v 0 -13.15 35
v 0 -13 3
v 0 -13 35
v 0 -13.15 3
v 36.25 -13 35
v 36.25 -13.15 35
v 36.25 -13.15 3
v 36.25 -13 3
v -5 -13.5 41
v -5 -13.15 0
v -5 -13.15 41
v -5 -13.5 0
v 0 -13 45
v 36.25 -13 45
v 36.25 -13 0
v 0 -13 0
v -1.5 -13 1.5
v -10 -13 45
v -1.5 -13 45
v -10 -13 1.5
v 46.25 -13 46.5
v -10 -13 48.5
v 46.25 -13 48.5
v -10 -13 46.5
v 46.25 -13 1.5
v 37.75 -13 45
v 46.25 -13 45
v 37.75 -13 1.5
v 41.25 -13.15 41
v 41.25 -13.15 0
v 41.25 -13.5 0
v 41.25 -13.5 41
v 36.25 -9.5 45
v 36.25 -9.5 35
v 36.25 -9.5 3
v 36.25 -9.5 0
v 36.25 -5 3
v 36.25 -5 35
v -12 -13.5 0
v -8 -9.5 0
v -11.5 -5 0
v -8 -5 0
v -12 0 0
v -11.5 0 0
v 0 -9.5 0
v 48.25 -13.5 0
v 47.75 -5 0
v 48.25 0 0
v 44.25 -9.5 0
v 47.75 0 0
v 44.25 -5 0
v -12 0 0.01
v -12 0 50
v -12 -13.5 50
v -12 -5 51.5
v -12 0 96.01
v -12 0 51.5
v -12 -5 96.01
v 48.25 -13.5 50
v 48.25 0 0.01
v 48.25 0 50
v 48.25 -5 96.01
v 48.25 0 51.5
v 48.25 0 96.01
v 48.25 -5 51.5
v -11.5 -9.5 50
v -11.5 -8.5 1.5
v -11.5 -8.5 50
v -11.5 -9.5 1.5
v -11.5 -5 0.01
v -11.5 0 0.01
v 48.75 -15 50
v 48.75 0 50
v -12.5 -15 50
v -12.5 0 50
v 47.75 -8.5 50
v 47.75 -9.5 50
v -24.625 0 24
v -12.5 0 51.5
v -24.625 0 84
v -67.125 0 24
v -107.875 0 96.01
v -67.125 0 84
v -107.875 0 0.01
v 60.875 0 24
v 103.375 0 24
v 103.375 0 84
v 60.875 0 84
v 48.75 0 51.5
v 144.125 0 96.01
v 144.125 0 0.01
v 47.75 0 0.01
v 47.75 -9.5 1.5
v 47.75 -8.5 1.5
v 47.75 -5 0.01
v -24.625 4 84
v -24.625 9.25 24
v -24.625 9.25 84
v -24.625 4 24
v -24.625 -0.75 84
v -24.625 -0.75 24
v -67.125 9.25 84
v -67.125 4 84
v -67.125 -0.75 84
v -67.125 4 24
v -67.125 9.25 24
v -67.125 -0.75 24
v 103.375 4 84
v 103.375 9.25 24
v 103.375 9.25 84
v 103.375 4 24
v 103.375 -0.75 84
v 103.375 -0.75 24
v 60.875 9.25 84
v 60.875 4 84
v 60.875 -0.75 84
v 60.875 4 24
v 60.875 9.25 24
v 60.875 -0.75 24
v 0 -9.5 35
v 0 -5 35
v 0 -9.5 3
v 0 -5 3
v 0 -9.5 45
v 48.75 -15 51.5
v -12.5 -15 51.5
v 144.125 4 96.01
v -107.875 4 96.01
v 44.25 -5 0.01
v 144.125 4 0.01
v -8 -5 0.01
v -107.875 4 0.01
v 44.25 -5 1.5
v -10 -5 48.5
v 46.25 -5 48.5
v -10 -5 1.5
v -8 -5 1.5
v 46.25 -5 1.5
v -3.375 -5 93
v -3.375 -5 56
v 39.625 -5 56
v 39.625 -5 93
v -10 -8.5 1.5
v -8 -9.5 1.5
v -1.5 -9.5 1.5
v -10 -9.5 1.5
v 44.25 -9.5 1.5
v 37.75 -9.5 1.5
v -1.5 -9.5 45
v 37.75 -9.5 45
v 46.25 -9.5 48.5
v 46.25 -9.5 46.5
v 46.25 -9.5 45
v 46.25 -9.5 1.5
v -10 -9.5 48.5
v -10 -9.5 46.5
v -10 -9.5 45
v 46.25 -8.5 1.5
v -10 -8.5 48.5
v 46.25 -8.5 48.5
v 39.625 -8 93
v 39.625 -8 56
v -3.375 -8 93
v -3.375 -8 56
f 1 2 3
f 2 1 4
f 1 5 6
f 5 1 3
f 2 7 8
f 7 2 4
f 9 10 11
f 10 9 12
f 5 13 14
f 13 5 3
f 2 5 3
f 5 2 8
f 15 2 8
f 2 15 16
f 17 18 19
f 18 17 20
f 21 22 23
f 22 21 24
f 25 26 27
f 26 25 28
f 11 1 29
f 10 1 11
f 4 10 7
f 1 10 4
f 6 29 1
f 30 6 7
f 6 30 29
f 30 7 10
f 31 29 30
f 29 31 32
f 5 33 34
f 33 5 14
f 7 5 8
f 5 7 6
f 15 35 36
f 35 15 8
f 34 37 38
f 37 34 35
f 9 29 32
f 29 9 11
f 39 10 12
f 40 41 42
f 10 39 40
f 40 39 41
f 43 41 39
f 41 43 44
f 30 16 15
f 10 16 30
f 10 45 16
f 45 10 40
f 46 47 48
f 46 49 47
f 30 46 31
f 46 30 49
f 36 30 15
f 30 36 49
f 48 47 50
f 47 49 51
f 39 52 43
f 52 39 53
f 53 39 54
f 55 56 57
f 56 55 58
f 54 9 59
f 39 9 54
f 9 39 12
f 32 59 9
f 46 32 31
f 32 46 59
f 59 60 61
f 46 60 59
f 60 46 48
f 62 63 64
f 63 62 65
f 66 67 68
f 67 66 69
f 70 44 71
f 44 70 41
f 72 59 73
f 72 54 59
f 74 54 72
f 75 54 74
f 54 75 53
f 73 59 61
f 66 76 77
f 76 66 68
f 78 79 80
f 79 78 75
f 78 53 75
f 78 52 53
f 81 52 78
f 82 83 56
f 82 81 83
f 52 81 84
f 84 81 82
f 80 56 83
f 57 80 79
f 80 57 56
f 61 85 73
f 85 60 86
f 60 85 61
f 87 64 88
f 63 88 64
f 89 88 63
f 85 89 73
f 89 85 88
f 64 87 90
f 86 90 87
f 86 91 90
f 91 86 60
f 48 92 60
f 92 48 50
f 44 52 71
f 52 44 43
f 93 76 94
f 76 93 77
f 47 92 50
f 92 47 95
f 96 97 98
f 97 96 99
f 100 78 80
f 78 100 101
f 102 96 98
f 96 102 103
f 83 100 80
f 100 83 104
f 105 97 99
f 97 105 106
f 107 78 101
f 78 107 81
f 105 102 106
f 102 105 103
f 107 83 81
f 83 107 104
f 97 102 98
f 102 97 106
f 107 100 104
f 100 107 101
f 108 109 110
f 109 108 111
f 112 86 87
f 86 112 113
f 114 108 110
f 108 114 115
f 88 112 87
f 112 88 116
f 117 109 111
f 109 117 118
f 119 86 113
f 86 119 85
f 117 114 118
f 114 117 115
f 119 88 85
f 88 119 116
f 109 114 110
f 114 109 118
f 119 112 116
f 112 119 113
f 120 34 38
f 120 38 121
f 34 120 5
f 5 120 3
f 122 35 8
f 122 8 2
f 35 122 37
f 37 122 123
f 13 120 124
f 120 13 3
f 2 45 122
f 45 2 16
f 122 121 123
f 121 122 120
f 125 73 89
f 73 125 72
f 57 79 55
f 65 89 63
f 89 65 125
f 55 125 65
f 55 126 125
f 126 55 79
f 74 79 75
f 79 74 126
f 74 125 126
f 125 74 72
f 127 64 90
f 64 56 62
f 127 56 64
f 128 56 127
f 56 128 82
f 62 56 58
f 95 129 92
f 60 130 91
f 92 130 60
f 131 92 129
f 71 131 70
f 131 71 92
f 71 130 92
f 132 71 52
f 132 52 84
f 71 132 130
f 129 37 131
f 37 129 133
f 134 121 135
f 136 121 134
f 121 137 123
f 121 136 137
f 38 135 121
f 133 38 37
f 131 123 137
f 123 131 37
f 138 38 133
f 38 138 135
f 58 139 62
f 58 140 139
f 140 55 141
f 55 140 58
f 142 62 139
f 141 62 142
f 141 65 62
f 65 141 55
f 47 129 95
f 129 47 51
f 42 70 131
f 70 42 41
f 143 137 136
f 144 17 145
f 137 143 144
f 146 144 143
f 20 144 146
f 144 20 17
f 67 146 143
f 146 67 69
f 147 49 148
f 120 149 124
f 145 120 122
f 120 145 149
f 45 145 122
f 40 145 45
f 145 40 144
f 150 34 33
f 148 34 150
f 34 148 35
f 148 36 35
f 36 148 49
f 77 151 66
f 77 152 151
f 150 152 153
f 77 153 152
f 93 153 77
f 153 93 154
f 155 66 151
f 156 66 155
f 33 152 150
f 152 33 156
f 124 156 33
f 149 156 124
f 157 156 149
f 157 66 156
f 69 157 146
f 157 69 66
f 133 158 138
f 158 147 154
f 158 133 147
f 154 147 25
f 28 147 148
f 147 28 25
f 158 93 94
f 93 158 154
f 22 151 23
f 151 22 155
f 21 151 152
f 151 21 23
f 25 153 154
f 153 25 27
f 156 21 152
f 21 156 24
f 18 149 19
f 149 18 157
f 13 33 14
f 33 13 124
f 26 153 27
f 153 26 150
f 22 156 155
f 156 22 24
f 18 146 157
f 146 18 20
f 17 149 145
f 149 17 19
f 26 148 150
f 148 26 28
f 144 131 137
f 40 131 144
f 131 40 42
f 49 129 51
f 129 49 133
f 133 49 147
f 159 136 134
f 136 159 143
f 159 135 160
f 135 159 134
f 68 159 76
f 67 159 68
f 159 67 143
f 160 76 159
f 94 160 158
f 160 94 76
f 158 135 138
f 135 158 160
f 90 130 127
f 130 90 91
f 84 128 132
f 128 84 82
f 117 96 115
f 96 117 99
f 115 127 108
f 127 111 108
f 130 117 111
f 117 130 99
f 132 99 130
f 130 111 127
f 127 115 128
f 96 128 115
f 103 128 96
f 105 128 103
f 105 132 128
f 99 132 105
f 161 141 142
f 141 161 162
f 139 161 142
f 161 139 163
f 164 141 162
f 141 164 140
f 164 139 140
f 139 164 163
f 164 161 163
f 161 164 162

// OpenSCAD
// Fireplace parameteric model V1
// 


/* [Colors (Red, Green, Blue)] */
// Ceiling
Ceil_Color = [0.95,0.95,0.95]; //[0:0.05:1]
ceil_color = Ceil_Color;
// Mantel
Matel_Color = [0.95,0.95,0.95]; //[0:0.05:1]
mantel_color = Matel_Color;
// Tile (right next to firebox)
Tile_Color = [0.75,0.75,0.75]; //[0:0.05:1]
tile_color = Tile_Color;
// Wall
Wall_Color = [0.45,0.45,0.45]; //[0:0.05:1]
wall_color = Wall_Color;
// Picture
Picture_Color = [0.75,0.75,0.75]; //[0:0.05:1]
picture_color = Picture_Color;
// Floor
Floor_Color = [0.45,0.35,0.15]; //[0:0.05:1]
floor_color = Floor_Color;


/* [Firebox Dimensions && Placement] */
// Width of the firebox opening
firebox_w = 36.25;//[0:0.05:40.0]
// Height of the firebox opening
firebox_h = 32.0;//[0:0.1:40.0]
// Depth of firebox (shouldn't really mater in most cases)
firebox_d = 16;//[0:0.05:20.0]
//How far does the firebox sticks out into the room (inch)
from_wall_d = 13; //[0:0.05:16.0]
// Top Clearance for Framing
firebox_top_framing_clearance = 10;
// Hide firebox
firebox_hide = false;


/* [Shelf Overhang && Thickness] ************************/
//Shelf overhang on left and right ends
mantel_shelf_overhang_w = 0.5; //[0:0.25:10.0] 
//Shelf overhang into the room from mantel body
mantel_shelf_overhang_d = 1.5; //[0:0.25:10.0]
//Shelf thickness height
mantel_shelf_h = 1.5;


/* [Mantel Height Adjustments] */
//Mantel visible on top of the tile below the shelf
mantel_top_h = 9;//[0:0.25:192.0]
//Tile visible on top of the firebox
tile_top_h = 6; //[0:0.25:192.0]
//Lift Firebox Up
firebox_lift_height = 3;//[0:0.1:10]

/* [Mantel Width Adjustments] */
//Mantel visible on each side of the tile
mantel_leg_w = 7;//[0:0.25:15.0]
//Tile visible on each side of the firebox
tile_leg_w = 5; //[0:0.25:20.0]

/* [Thickness && Side Material] */
// Thickness of the tile
tile_depth = 0.15;
//Tile Sides - tiles the sides
tile_sides = false;
//Thickness of the material
mantel_front_d = .5;


/* [Fireplace Bump Out] */
//Show the mantel bump out
show_above_mantel = true;
//Above fireplace (inch)
above_fireplace_depth = 5;//[0:0.1:10.0]
above_fireplace_width_inset = 0;//[-10.0:0.01:10.0]

/* [Room] */
//Show Wall
show_wall = true;
//Height of ceiling (inch)
ceiling_height = 96; //[36:0.5:192]
// Show ceiling
show_ceil = false;
//Width of the wall (feet)
wall_width_feet = 21; // [0:0.25:50]
//Show Floor
show_floor = false;
//Floor depth from wall (feet)
floor_depth_feet = 21; // [0:0.25:50]

//Show Windows
show_windows = true;
//Distance between windows
window_distance = 85.5; //[0:0.5:192]
//Windows width, height
window_dimensions = [42.5, 60];
//Window height above floor
window_above_floor = 24; //[0:0.5:192]

/* [Picture] */
//Show Picture over mantel
show_picture = true;
//Picture Width,Height,Depth 
picture_dim = [43, 37, 3];
//Picture Height above floor
picture_z = 56; //[0:0.5:192]
// Picture Color (R,G,B)
//Picture_Color = [0.75,0.75,0.75]; //[0:0.05:1]
//picture_color = Picture_Color;

/* [Show Frame] */
show_frame = false;
//frame_dim = ["2x4","2x6"];

/* [Show Dimensions] */
// Show Dimensions (inch)
show_dims = true;

// *********************************************************************

// Firebox
    if (!firebox_hide) {
        color("black")
        translate([0, -from_wall_d, firebox_lift_height]) 
        cube([firebox_w,firebox_d,firebox_h], false);
    }

//Under Firebox
    uf_w = firebox_w + (tile_leg_w * 2); 
    uf_d = tile_depth;
    uf_h = firebox_lift_height;

    uf_x = -tile_leg_w;
    uf_y = -tile_depth - from_wall_d;

    color(tile_color)
    translate([uf_x, uf_y])
    cube([uf_w,uf_d,uf_h], false);

// Tile Top
    tt_w = (2 * tile_leg_w) + firebox_w;
    tt_d = tile_depth;
    tt_h = tile_top_h;

    tt_x = -tile_leg_w;
    tt_y =  -tile_depth - from_wall_d;
    tt_z = firebox_lift_height + firebox_h;

    if (!show_frame) {
        color(tile_color)
        translate([tt_x, tt_y, tt_z]) 
        cube([tt_w,,tt_d, tt_h], false);
    }

// Tile Legs (tile next to firebox horizontal sides)
    tl_w = tile_leg_w;
    tl_d = tile_depth;
    tl_h = firebox_h;

    tl_l_x = -tl_w;
    tl_y = -tile_depth - from_wall_d;
    tl_z = firebox_lift_height;
    
    tl_r_x = firebox_w;

    if (!show_frame) {
        color(tile_color)
        translate([tl_l_x, tl_y, tl_z]) 
        cube([tl_w,tl_d, tl_h], false);
    
        color(tile_color)
        translate([tl_r_x, tl_y, tl_z]) 
        cube([tl_w,tl_d, tl_h], false);
    }
    
// Mantel Shelf
    shelf_w = (2 * tile_leg_w) + firebox_w + (2 * mantel_leg_w) + (2 * mantel_shelf_overhang_w);
    shelf_d = mantel_shelf_overhang_d + mantel_front_d + from_wall_d;
    shelf_h = mantel_shelf_h;

    shelf_x = -tile_leg_w - mantel_leg_w - mantel_shelf_overhang_w;
    shelf_y = -shelf_d;
    shelf_z = firebox_h + tile_top_h + mantel_top_h + firebox_lift_height;

    if (!show_frame) {
        color(mantel_color)
        translate([shelf_x, shelf_y, shelf_z]) 
        cube([shelf_w, shelf_d, shelf_h], false);
    }

// Mantel Top (wood or other material under shelf)
    mt_w = (2 * tile_leg_w) + firebox_w + (2 * mantel_leg_w);
    mt_d = mantel_front_d;
    mt_h = mantel_top_h;

    mt_x = -tile_leg_w - mantel_leg_w;
    mt_y = -mantel_front_d - from_wall_d;
    mt_z = firebox_h + tile_top_h + firebox_lift_height;

    if (!show_frame) {
        color(mantel_color)
        translate([mt_x, mt_y, mt_z]) 
        cube([mt_w,mt_d, mt_h], false);
    }
    
// Mantel Legs (wood or other material on horizontal outside of  tile and firebox)
    m_w = mantel_leg_w;
    m_d = mantel_front_d;
    m_h = firebox_h + tile_top_h + firebox_lift_height;

    m_l_x = -tile_leg_w - mantel_leg_w;
    m_y = -mantel_front_d - from_wall_d;
    
    m_r_x = firebox_w + tile_leg_w;

    if (!show_frame) {
        color(mantel_color)
        translate([m_l_x, m_y]) 
        cube([m_w, m_d, m_h], false);

        color(mantel_color)
        translate([m_r_x, m_y]) 
        cube([m_w, m_d, m_h], false);
    }

// Mantel Returns Top
    returnt_w = mantel_front_d;
    returnt_d = from_wall_d;
    returnt_h = mantel_top_h;

    returnt_l_x = -tile_leg_w - mantel_leg_w;
    returnt_y = - from_wall_d;
    returnt_z = firebox_h + tile_top_h + firebox_lift_height;
    
    returnt_r_x = firebox_w + tile_leg_w + mantel_leg_w - mantel_front_d;

    if (!show_frame) {
        color(mantel_color)
        translate([returnt_l_x, returnt_y, returnt_z]) 
        cube([returnt_w,returnt_d, returnt_h], false);

        color(mantel_color)
        translate([returnt_r_x, returnt_y, returnt_z]) 
        cube([returnt_w,returnt_d, returnt_h], false);
    }

// Mantel Returns Bottom
    // test ? TrueValue : FlaseValue
    returnb_color = tile_sides ? tile_color : mantel_color ;

    returnb_w = mantel_front_d;
    returnb_d = from_wall_d;
    returnb_h = firebox_h + tile_top_h + firebox_lift_height;

    returnb_l_x = -tile_leg_w - mantel_leg_w;
    returnb_y = - from_wall_d;
    
    returnb_r_x = firebox_w + tile_leg_w + mantel_leg_w - mantel_front_d;

    if (!show_frame) {
        color(returnb_color)
        translate([returnb_l_x, returnb_y]) 
        cube([returnb_w,returnb_d, returnb_h], false);

        color(returnb_color)
        translate([returnb_r_x, returnb_y]) 
        cube([returnb_w,returnb_d, returnb_h], false);
    }

// Above Mantel
    above_w = firebox_w + (2 * tile_leg_w) + (2 * mantel_leg_w) - (above_fireplace_width_inset * 2);
    above_d = above_fireplace_depth;
    above_h = ceiling_height;

    above_x = (firebox_w/2) - (above_w/2);
    above_y = -above_d;
    above_z = 0.01;
    
    if (show_above_mantel && !show_frame) {
        color("gray")
        translate([above_x, above_y, above_z]) 
        cube([above_w, above_d, above_h], false);
    }

// Frame
    // Legs floor
    frame_leg_floor_w = tile_leg_w + mantel_leg_w - mantel_front_d;
    frame_leg_floor_d = 3.5;
    frame_leg_floor_h = 1.5;
    
    frame_leg_floor_l_x = -tile_leg_w - mantel_leg_w + mantel_front_d;
    frame_leg_floor_r_x = firebox_w;
    
    frame_leg_floor_y = - from_wall_d;
    frame_leg_floor_z = 0;

        color("orange")
        translate([frame_leg_floor_l_x, frame_leg_floor_y, frame_leg_floor_z]) 
        cube([frame_leg_floor_w, frame_leg_floor_d, frame_leg_floor_h], false);

        color("orange")
        translate([frame_leg_floor_r_x, frame_leg_floor_y, frame_leg_floor_z]) 
        cube([frame_leg_floor_w, frame_leg_floor_d, frame_leg_floor_h], false);
    
    // Under Shelf
    frame_under_shelf_w = (2* tile_leg_w) + (2 * mantel_leg_w) + firebox_w - (2 * mantel_front_d);
    frame_under_shelf_d = 3.5;
    frame_under_shelf_h = 1.5;
    
    frame_under_shelf_x = -tile_leg_w - mantel_leg_w + mantel_front_d;
    frame_under_shelf_y = - from_wall_d;
    frame_under_shelf_z = firebox_h + tile_top_h + mantel_top_h + firebox_lift_height - frame_under_shelf_h;
 
        color("orange")
        translate([frame_under_shelf_x, frame_under_shelf_y, frame_under_shelf_z]) 
        cube([frame_under_shelf_w, frame_under_shelf_d, frame_under_shelf_h], false);
        
        
    // Top with clearance
    //firebox_top_framing_clearance
    frame_above_firebox_w = (2* tile_leg_w) + (2 * mantel_leg_w) + firebox_w - (2 * mantel_front_d) - (2 * 1.5);
    frame_above_firebox_d = 3.5;
    frame_above_firebox_h = 1.5;
    
    frame_above_firebox_x = -tile_leg_w - mantel_leg_w + mantel_front_d + 1.5;
    frame_above_firebox_y = - from_wall_d;
    frame_above_firebox_z = firebox_h + firebox_lift_height + firebox_top_framing_clearance;
 
        color("orange")
        translate([frame_above_firebox_x, frame_above_firebox_y, frame_above_firebox_z]) 
        cube([frame_above_firebox_w, frame_above_firebox_d, frame_above_firebox_h], false);
       
    // Outside Leg
    frame_leg_outside_w = 1.5;
    frame_leg_outside_d = 3.5;
    frame_leg_outside_h = firebox_h + tile_top_h + mantel_top_h + firebox_lift_height - frame_under_shelf_h - 1.5;
    
    frame_leg_outside_l_x = -tile_leg_w - mantel_leg_w + mantel_front_d;
    frame_leg_outside_r_x = firebox_w + tile_leg_w + mantel_leg_w - mantel_front_d - 1.5;
    
    frame_leg_outside_y = - from_wall_d;
    frame_leg_outside_z = 1.5;

        color("orange")
        translate([frame_leg_outside_l_x, frame_leg_outside_y, frame_leg_outside_z]) 
        cube([frame_leg_outside_w, frame_leg_outside_d, frame_leg_outside_h], false);

        color("orange")
        translate([frame_leg_outside_r_x, frame_leg_outside_y, frame_leg_outside_z]) 
        cube([frame_leg_outside_w, frame_leg_outside_d, frame_leg_outside_h], false);
        
    // Inside Leg
    frame_leg_inside_w = 1.5;
    frame_leg_inside_d = 3.5;
    frame_leg_inside_h = firebox_h + firebox_lift_height + firebox_top_framing_clearance - 1.5;
    
    frame_leg_inside_l_x = -1.5;
    frame_leg_inside_r_x = firebox_w;
    
    frame_leg_inside_y = - from_wall_d;
    frame_leg_inside_z = 1.5;

        color("orange")
        translate([frame_leg_inside_l_x, frame_leg_inside_y, frame_leg_inside_z]) 
        cube([frame_leg_inside_w, frame_leg_inside_d, frame_leg_inside_h], false);

        color("orange")
        translate([frame_leg_inside_r_x, frame_leg_inside_y, frame_leg_inside_z]) 
        cube([frame_leg_inside_w, frame_leg_inside_d, frame_leg_inside_h], false);
        
    // Legs Floor Return
    
    above_frame_y = show_above_mantel ? -above_fireplace_depth : 0;
    
    frame_leg_f_return_w = 3.5;
    frame_leg_f_return_d = (from_wall_d - 3.5 + above_frame_y) ;
    frame_leg_f_return_h = 1.5;
    
    frame_leg_f_return_l_x = -tile_leg_w - mantel_leg_w + mantel_front_d;
    frame_leg_f_return_r_x = firebox_w + tile_leg_w + mantel_leg_w - mantel_front_d - 3.5;
    
    frame_leg_f_return_y = -from_wall_d + 3.5;
    frame_leg_f_return_z = 0;

        color("orange")
        translate([frame_leg_f_return_l_x, frame_leg_f_return_y, frame_leg_f_return_z]) 
        cube([frame_leg_f_return_w, frame_leg_f_return_d, frame_leg_f_return_h], false);

        color("orange")
        translate([frame_leg_f_return_r_x, frame_leg_f_return_y, frame_leg_f_return_z]) 
        cube([frame_leg_f_return_w, frame_leg_f_return_d, frame_leg_f_return_h], false);
    
    // Outside Leg Wall
    frame_leg_outside_wall_w = 1.5;
    frame_leg_outside_wall_d = 3.5;
    frame_leg_outside_wall_h = firebox_h + tile_top_h + mantel_top_h + firebox_lift_height - frame_under_shelf_h - 1.5;
    
    frame_leg_outside_wall_l_x = -tile_leg_w - mantel_leg_w + mantel_front_d;
    frame_leg_outside_wall_r_x = firebox_w + tile_leg_w + mantel_leg_w - mantel_front_d - 1.5;
    
    frame_leg_outside_wall_y = above_frame_y - 3.5;
    frame_leg_outside_wall_z = 1.5;

        color("green")
        translate([frame_leg_outside_wall_l_x, frame_leg_outside_wall_y, frame_leg_outside_wall_z]) 
        cube([frame_leg_outside_wall_w, frame_leg_outside_wall_d, frame_leg_outside_wall_h], false);

        color("green")
        translate([frame_leg_outside_wall_r_x, frame_leg_outside_wall_y, frame_leg_outside_wall_z]) 
        cube([frame_leg_outside_wall_w, frame_leg_outside_wall_d, frame_leg_outside_wall_h], false);
 
    // Under Shelf Wall    
    frame_under_shelf_wall_x = -tile_leg_w - mantel_leg_w + mantel_front_d;
    frame_under_shelf_wall_y = above_frame_y - 3.5;
    frame_under_shelf_wall_z = firebox_h + tile_top_h + mantel_top_h + firebox_lift_height - frame_under_shelf_h;
 
        color("blue")
        translate([frame_under_shelf_wall_x, frame_under_shelf_wall_y, frame_under_shelf_wall_z]) 
        cube([frame_under_shelf_w, frame_under_shelf_d, frame_under_shelf_h], false);
        
        
    // Wall Bump Out Corners Framing
    frame_wall_vert_w = 1.5;
    frame_wall_vert_d = 3.5;
    frame_wall_vert_h = ceiling_height - (2 * 1.5);
    
    frame_wall_vert_lc_x = 0.5 -(firebox_w + (2 * tile_leg_w) + (2 * mantel_leg_w) - (above_fireplace_width_inset * 2))/2 + (firebox_w/2);
    frame_wall_vert_rc_x = (firebox_w + (2 * tile_leg_w) + (2 * mantel_leg_w) - (above_fireplace_width_inset * 2))/2 + (firebox_w/2) - 0.5 - 1.5;
    frame_wall_vert_y = -3.5;
    frame_wall_vert_z = 1.5;
    
        color("red")
        translate([frame_wall_vert_lc_x, frame_wall_vert_y, frame_wall_vert_z]) 
        cube([frame_wall_vert_w, frame_wall_vert_d, frame_wall_vert_h], false);
        
        color("red")
        translate([frame_wall_vert_rc_x, frame_wall_vert_y, frame_wall_vert_z]) 
        cube([frame_wall_vert_w, frame_wall_vert_d, frame_wall_vert_h], false);
    



// Windows
if (show_windows) {
    window_w = window_dimensions[0];
    window_d = 10;
    window_h = window_dimensions[1];
    // Left Window
    window_l_x = 0 + (firebox_w/2) - window_w - (window_distance/2);
    window_y = -0.75;
    window_z = window_above_floor;
    translate([window_l_x, window_y, window_z]) 
    cube([window_w, window_d, window_h], false);
    // Right Window
    window_r_x = (window_distance/2) + (firebox_w/2);
    translate([window_r_x, window_y, window_z]) 
    cube([window_w, window_d, window_h], false);
}

// Wall
if (show_wall) {
    wall_w = wall_width_feet*12;
    wall_d = 4;
    wall_h = ceiling_height;
    
    wall_x = -wall_w/2 + (firebox_w/2);
    color(wall_color)
    translate([wall_x, 0, 0.01]) 
    cube([wall_w, wall_d, wall_h], false);
}

if (show_floor) {
    floor_w = wall_width_feet*12;
    floor_d = floor_depth_feet*12;
    floor_h = 1;
    
    floor_x = -(wall_width_feet*12)/2 + (firebox_w/2);
    floor_y = -floor_d;
    color(floor_color)
    translate([floor_x, floor_y, -floor_h]) 
    cube([floor_w, floor_d, floor_h], false);
}

if (show_ceil) {
    ceil_w = wall_width_feet*12;
    ceil_d = floor_depth_feet*12;
    ceil_h = 1;
    
    ceil_x = -(wall_width_feet*12)/2 + (firebox_w/2);
    ceil_y = -ceil_d;
    ceil_z  = ceiling_height;
    color(ceil_color)
    translate([ceil_x, ceil_y, ceil_z]) 
    cube([ceil_w, ceil_d, ceil_h], false);
}

// Picture
if (show_picture) {
    // If the above mantel bump-out is enabled
    above_y = show_above_mantel ? -above_fireplace_depth : 0;
    
    pic_w = picture_dim[0];
    pic_d = 3;
    pic_h = picture_dim[1];

    pic_x = firebox_w/2 - pic_w/2;
    pic_y = above_y - pic_d;
    pic_z = picture_z;

    color(picture_color)
    translate([pic_x, pic_y, pic_z]) 
    cube([pic_w, pic_d, pic_h], false);
}



// -----------------------------------------------------------------
// Shelf Width Dimension

if (show_dims) {
    // Shelf Width
    dim_x = firebox_w + tile_leg_w + mantel_leg_w;
    dim_y = shelf_y - mantel_front_d - 5;
    
    mantel_wshelf_dim_str = str("Shelf Width ",str(shelf_w));
    
    color("red")
    translate([dim_x, dim_y, shelf_z])
    rotate([90])
    text(str(mantel_wshelf_dim_str), size= 5, halign = "left");

    // Shelf depth
    above_d = show_above_mantel ? above_fireplace_depth : 0;
    shelf_depth = shelf_d - above_d;
    
    mantel_shelf_depth_dim_str = str("Shelf Depth ",str(shelf_depth));
    
    color("red")
    translate([dim_x, dim_y, shelf_z + 6])
    rotate([90])
    text(mantel_shelf_depth_dim_str, size=5, halign = "left");

    // Front Width Dimension
    front_w = firebox_w + (2 * tile_leg_w) + (2 * mantel_leg_w);
    
    mantel_wfront_dim_str = str("Front Width ",str(shelf_w));
    
    color("red")
    translate([dim_x, dim_y, 0])
    rotate([90])
    text(mantel_wfront_dim_str, size=5, halign = "left");

    // Heigth Dimension
    mantel_h = shelf_z + mantel_shelf_h;
    
    mantel_h_dim_str = str("Height ",str(mantel_h));
    
    color("red")
    translate([dim_x , dim_y, mantel_h/2])
    rotate([90])
    text(mantel_h_dim_str, size=5, halign = "left");
    
    // Side Dimensions
    above_y = show_above_mantel ? above_fireplace_depth : 0;
    mantel_d_side = above_fireplace_width_inset < 0 ? mantel_front_d + from_wall_d - above_y : mantel_front_d + from_wall_d;
    
    mantel_d_side_dim_str = str("Side Depth ",str(mantel_d_side));
    
    color("red")
    translate([dim_x , dim_y, (mantel_h/2) - 6])
    rotate([90])
    text(mantel_d_side_dim_str, size=5, halign = "left");

}
